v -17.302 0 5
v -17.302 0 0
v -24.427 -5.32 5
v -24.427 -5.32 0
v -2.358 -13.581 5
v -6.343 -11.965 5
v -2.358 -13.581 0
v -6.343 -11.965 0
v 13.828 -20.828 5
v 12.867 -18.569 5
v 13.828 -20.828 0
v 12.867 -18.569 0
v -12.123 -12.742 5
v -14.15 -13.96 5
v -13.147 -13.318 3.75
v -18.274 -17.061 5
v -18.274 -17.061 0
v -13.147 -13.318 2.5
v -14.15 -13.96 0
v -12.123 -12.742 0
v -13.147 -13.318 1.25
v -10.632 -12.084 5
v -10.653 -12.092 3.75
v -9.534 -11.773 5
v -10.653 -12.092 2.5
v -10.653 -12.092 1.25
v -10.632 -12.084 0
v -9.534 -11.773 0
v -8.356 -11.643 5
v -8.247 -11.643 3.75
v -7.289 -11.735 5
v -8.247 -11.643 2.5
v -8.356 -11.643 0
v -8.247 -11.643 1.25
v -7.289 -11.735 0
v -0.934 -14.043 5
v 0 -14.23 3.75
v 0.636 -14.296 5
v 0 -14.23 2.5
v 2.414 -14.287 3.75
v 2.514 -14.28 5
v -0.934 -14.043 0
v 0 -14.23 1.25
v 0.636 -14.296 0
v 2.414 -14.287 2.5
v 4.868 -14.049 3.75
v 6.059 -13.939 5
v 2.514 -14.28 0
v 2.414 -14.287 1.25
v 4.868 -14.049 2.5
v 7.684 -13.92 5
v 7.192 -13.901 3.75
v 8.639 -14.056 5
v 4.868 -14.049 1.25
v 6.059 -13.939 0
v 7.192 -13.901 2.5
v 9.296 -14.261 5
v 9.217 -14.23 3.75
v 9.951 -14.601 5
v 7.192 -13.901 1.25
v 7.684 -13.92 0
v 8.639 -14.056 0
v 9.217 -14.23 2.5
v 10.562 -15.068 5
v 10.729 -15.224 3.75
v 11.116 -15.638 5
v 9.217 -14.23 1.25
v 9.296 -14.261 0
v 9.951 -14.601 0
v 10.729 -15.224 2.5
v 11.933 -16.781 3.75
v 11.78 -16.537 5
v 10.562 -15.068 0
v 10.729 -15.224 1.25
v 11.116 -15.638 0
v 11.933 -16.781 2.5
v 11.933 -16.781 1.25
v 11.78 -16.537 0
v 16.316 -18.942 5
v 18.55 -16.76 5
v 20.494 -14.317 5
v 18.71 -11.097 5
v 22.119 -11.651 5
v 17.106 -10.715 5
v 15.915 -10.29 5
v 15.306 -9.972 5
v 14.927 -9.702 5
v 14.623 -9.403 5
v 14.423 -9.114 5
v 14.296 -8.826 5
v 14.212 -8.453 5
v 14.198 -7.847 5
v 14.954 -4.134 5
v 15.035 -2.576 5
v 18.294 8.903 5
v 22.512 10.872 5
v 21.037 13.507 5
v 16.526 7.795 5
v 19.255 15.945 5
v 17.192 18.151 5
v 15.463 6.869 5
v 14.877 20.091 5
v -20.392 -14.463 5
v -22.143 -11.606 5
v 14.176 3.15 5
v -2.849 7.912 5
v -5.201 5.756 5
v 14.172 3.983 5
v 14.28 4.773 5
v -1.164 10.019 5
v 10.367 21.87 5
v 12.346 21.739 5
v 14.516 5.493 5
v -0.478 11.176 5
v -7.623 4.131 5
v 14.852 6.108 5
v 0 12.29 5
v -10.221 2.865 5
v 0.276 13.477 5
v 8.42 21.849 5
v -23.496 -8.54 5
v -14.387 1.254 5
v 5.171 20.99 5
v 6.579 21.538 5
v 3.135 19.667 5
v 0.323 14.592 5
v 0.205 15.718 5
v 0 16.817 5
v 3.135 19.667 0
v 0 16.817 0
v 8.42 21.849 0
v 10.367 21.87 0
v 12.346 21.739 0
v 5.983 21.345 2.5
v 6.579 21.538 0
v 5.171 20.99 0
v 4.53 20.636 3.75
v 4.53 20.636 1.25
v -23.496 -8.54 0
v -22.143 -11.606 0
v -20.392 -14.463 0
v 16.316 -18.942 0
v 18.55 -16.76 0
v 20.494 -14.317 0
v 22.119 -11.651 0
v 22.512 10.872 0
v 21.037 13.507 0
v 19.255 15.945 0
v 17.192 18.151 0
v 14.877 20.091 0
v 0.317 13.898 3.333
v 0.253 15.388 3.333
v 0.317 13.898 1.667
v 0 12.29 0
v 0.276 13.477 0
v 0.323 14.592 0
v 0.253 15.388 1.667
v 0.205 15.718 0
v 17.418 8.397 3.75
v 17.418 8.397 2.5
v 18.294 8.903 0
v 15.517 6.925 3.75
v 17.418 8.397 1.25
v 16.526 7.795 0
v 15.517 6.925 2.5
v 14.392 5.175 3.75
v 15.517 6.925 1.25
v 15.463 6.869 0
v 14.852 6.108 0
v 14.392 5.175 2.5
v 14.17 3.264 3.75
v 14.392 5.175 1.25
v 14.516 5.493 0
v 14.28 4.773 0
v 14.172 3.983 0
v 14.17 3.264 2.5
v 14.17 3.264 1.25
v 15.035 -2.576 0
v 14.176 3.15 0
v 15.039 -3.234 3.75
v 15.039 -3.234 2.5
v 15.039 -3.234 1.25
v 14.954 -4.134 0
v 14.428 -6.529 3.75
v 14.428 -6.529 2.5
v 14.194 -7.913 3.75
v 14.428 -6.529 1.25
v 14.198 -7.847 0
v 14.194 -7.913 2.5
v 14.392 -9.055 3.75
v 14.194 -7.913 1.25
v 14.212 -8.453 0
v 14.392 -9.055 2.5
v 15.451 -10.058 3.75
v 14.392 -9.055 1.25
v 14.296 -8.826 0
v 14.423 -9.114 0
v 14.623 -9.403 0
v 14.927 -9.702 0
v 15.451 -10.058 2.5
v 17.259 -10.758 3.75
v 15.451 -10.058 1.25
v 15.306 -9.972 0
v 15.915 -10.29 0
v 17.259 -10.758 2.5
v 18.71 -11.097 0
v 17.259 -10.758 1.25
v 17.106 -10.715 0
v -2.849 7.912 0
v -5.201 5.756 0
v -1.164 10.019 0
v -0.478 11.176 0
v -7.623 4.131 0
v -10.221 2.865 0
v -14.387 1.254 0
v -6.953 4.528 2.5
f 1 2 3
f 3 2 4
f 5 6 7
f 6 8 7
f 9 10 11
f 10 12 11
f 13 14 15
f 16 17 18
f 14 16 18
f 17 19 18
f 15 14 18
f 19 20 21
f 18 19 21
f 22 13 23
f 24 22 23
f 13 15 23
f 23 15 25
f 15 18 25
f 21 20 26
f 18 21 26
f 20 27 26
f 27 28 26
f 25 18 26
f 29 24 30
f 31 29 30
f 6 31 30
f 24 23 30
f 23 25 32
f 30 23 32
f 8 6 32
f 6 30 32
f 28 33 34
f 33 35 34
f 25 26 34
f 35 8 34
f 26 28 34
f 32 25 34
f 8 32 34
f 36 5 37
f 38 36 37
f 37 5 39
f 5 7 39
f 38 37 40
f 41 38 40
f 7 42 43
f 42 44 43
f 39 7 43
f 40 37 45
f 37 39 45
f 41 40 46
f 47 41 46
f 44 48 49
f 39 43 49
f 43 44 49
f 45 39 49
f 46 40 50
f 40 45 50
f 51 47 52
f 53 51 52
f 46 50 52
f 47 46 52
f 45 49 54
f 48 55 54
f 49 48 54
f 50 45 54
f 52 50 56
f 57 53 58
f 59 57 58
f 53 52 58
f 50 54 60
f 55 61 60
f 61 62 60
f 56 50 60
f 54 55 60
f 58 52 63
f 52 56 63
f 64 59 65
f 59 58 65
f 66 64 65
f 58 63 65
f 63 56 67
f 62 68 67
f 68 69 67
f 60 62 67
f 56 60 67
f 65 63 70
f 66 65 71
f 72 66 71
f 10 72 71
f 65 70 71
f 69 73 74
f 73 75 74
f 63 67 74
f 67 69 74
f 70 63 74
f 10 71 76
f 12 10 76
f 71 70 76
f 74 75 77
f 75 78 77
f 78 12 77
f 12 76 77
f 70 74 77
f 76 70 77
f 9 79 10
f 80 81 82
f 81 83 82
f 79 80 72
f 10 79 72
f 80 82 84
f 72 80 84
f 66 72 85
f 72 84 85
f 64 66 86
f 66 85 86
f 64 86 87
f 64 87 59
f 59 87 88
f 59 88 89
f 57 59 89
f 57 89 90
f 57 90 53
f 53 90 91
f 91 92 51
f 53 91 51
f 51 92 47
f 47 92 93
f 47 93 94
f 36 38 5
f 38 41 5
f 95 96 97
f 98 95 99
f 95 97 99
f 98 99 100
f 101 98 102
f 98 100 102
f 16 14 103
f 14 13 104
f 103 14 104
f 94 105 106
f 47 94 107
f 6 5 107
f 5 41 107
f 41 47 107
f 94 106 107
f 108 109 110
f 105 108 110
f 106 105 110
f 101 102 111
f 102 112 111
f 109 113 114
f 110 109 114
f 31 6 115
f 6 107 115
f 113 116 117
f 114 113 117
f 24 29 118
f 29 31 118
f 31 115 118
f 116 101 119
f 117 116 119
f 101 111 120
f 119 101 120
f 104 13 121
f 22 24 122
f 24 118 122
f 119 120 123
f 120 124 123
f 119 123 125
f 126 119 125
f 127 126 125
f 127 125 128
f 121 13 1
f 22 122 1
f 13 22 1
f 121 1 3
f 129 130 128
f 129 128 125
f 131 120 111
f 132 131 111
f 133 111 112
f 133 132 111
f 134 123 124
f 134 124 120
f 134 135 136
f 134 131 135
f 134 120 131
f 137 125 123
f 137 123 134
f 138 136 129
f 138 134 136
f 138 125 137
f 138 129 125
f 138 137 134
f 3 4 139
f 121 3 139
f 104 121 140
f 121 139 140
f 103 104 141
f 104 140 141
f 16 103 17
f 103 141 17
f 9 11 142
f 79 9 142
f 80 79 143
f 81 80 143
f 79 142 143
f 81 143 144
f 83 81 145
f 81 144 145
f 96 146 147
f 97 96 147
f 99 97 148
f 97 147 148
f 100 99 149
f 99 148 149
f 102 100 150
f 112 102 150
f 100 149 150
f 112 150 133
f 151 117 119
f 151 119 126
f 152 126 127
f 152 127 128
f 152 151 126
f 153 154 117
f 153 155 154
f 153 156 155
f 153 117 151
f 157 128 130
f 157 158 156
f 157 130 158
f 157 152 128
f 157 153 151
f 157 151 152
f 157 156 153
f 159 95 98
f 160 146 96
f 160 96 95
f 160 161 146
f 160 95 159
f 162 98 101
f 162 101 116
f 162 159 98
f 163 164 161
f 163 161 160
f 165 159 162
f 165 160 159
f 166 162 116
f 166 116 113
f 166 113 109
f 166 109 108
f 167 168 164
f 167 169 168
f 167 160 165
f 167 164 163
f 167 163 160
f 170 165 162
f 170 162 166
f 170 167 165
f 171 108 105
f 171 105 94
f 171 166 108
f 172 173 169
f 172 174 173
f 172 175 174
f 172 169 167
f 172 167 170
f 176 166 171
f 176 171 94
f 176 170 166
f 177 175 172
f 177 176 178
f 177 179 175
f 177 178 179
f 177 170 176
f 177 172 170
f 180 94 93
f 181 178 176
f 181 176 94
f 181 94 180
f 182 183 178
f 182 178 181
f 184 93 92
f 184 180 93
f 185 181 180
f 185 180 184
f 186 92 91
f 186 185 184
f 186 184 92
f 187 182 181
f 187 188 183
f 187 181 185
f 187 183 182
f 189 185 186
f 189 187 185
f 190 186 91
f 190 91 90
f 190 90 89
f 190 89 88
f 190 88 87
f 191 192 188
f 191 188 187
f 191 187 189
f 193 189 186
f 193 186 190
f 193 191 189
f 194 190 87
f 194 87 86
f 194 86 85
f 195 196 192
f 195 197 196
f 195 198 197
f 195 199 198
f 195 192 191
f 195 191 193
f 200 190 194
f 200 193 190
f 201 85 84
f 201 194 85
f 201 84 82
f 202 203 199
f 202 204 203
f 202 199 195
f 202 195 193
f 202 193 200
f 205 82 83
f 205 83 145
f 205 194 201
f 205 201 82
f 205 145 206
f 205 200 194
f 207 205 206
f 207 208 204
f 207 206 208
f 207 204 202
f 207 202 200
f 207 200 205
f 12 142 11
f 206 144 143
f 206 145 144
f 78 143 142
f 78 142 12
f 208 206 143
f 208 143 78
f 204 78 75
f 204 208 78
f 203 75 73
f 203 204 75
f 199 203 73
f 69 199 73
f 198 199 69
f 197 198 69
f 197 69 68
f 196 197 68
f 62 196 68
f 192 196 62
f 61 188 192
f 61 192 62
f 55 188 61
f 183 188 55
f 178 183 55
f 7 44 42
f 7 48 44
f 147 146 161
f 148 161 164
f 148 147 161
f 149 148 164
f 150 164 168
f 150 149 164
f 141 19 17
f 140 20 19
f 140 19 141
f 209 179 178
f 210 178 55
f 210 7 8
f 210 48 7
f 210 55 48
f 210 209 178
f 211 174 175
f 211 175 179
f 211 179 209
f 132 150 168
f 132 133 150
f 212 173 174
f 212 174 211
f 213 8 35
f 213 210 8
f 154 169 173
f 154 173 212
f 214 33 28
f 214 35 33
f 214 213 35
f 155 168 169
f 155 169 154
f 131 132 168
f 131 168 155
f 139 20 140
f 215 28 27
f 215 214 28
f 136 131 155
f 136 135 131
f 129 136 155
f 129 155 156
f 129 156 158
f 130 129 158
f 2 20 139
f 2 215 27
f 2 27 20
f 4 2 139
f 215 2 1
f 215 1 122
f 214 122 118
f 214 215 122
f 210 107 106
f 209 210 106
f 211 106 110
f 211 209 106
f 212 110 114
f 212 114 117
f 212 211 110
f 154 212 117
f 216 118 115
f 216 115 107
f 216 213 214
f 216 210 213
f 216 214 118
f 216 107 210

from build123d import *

# Parameters (mm, degrees)
F1_DEPTH = 5


with BuildPart() as f1:
    # F0 (on Top) → F1 (new body)
    with BuildSketch(Plane.XY):
        with BuildLine():
            add(Edge.make_bspline(
                [(22.5121691, 10.8720854676), (18.8895611428, 9.3055197167), (11.9102659407, 6.2896821538), (16.4364178682, -3.0658471403), (12.2521680449, -10.2063529762), (18.6615851191, -11.1474987265), (22.1188925873, -11.6513772023)],
                knots=[0, 0, 0, 0, 0.2780136343, 0.5343531988, 0.7479805585, 1, 1, 1, 1], degree=3))
            ThreePointArc((22.5121691, 10.8720854676), (18.2564856156, 17.0792486067), (12.34633467, 21.7386296766))
            add(Edge.make_bspline(
                [(0, 16.8172493577), (1.9144161531, 18.6824676113), (5.5934798745, 22.2645311542), (10.1584208321, 21.9120162799), (12.34633467, 21.7386296766)],
                knots=[0, 0, 0, 0, 0.5203475383, 1, 1, 1, 1], degree=3))
            add(Edge.make_bspline(
                [(0, 12.2895278037), (0.5700685894, 13.9777110398), (0.2850342947, 15.3974801988), (0, 16.8172493577)],
                knots=[0.8181160828, 0.8181160828, 0.8181160828, 0.8181160828, 1, 1, 1, 1], degree=3))
            add(Edge.make_bspline(
                [(-17.3023622483, 0), (-14.1903788127, 1.5720662607), (-6.6472654424, 3.2397841474), (-0.8648455283, 9.7284013886), (0, 12.2895278037)],
                knots=[0.254891956, 0.254891956, 0.254891956, 0.254891956, 0.542181756, 0.8181160828, 0.8181160828, 0.8181160828, 0.8181160828], degree=3))
            Line((-17.3023622483, 0), (-24.4273769181, -5.3200805351))
            ThreePointArc((-24.4273769181, -5.3200805351), (-22.1428727527, -11.6057393672), (-18.2737018092, -17.0608271249))
            add(Edge.make_bspline(
                [(-18.2737018092, -17.0608271249), (-14.8332101277, -14.3400323801), (-8.3808524987, -9.228978734), (-0.4412585546, -15.998889193), (10.2263751779, -12.0238586347), (12.6576888155, -17.9664290501), (13.8278126154, -20.8276642539)],
                knots=[0, 0, 0, 0, 0.2769679297, 0.5181649262, 0.767240907, 1, 1, 1, 1], degree=3))
            ThreePointArc((13.8278126154, -20.8276642539), (18.549729506, -16.7602963951), (22.1188925873, -11.6513772023))
        make_face()
    extrude(amount=F1_DEPTH)


solid = f1.part
